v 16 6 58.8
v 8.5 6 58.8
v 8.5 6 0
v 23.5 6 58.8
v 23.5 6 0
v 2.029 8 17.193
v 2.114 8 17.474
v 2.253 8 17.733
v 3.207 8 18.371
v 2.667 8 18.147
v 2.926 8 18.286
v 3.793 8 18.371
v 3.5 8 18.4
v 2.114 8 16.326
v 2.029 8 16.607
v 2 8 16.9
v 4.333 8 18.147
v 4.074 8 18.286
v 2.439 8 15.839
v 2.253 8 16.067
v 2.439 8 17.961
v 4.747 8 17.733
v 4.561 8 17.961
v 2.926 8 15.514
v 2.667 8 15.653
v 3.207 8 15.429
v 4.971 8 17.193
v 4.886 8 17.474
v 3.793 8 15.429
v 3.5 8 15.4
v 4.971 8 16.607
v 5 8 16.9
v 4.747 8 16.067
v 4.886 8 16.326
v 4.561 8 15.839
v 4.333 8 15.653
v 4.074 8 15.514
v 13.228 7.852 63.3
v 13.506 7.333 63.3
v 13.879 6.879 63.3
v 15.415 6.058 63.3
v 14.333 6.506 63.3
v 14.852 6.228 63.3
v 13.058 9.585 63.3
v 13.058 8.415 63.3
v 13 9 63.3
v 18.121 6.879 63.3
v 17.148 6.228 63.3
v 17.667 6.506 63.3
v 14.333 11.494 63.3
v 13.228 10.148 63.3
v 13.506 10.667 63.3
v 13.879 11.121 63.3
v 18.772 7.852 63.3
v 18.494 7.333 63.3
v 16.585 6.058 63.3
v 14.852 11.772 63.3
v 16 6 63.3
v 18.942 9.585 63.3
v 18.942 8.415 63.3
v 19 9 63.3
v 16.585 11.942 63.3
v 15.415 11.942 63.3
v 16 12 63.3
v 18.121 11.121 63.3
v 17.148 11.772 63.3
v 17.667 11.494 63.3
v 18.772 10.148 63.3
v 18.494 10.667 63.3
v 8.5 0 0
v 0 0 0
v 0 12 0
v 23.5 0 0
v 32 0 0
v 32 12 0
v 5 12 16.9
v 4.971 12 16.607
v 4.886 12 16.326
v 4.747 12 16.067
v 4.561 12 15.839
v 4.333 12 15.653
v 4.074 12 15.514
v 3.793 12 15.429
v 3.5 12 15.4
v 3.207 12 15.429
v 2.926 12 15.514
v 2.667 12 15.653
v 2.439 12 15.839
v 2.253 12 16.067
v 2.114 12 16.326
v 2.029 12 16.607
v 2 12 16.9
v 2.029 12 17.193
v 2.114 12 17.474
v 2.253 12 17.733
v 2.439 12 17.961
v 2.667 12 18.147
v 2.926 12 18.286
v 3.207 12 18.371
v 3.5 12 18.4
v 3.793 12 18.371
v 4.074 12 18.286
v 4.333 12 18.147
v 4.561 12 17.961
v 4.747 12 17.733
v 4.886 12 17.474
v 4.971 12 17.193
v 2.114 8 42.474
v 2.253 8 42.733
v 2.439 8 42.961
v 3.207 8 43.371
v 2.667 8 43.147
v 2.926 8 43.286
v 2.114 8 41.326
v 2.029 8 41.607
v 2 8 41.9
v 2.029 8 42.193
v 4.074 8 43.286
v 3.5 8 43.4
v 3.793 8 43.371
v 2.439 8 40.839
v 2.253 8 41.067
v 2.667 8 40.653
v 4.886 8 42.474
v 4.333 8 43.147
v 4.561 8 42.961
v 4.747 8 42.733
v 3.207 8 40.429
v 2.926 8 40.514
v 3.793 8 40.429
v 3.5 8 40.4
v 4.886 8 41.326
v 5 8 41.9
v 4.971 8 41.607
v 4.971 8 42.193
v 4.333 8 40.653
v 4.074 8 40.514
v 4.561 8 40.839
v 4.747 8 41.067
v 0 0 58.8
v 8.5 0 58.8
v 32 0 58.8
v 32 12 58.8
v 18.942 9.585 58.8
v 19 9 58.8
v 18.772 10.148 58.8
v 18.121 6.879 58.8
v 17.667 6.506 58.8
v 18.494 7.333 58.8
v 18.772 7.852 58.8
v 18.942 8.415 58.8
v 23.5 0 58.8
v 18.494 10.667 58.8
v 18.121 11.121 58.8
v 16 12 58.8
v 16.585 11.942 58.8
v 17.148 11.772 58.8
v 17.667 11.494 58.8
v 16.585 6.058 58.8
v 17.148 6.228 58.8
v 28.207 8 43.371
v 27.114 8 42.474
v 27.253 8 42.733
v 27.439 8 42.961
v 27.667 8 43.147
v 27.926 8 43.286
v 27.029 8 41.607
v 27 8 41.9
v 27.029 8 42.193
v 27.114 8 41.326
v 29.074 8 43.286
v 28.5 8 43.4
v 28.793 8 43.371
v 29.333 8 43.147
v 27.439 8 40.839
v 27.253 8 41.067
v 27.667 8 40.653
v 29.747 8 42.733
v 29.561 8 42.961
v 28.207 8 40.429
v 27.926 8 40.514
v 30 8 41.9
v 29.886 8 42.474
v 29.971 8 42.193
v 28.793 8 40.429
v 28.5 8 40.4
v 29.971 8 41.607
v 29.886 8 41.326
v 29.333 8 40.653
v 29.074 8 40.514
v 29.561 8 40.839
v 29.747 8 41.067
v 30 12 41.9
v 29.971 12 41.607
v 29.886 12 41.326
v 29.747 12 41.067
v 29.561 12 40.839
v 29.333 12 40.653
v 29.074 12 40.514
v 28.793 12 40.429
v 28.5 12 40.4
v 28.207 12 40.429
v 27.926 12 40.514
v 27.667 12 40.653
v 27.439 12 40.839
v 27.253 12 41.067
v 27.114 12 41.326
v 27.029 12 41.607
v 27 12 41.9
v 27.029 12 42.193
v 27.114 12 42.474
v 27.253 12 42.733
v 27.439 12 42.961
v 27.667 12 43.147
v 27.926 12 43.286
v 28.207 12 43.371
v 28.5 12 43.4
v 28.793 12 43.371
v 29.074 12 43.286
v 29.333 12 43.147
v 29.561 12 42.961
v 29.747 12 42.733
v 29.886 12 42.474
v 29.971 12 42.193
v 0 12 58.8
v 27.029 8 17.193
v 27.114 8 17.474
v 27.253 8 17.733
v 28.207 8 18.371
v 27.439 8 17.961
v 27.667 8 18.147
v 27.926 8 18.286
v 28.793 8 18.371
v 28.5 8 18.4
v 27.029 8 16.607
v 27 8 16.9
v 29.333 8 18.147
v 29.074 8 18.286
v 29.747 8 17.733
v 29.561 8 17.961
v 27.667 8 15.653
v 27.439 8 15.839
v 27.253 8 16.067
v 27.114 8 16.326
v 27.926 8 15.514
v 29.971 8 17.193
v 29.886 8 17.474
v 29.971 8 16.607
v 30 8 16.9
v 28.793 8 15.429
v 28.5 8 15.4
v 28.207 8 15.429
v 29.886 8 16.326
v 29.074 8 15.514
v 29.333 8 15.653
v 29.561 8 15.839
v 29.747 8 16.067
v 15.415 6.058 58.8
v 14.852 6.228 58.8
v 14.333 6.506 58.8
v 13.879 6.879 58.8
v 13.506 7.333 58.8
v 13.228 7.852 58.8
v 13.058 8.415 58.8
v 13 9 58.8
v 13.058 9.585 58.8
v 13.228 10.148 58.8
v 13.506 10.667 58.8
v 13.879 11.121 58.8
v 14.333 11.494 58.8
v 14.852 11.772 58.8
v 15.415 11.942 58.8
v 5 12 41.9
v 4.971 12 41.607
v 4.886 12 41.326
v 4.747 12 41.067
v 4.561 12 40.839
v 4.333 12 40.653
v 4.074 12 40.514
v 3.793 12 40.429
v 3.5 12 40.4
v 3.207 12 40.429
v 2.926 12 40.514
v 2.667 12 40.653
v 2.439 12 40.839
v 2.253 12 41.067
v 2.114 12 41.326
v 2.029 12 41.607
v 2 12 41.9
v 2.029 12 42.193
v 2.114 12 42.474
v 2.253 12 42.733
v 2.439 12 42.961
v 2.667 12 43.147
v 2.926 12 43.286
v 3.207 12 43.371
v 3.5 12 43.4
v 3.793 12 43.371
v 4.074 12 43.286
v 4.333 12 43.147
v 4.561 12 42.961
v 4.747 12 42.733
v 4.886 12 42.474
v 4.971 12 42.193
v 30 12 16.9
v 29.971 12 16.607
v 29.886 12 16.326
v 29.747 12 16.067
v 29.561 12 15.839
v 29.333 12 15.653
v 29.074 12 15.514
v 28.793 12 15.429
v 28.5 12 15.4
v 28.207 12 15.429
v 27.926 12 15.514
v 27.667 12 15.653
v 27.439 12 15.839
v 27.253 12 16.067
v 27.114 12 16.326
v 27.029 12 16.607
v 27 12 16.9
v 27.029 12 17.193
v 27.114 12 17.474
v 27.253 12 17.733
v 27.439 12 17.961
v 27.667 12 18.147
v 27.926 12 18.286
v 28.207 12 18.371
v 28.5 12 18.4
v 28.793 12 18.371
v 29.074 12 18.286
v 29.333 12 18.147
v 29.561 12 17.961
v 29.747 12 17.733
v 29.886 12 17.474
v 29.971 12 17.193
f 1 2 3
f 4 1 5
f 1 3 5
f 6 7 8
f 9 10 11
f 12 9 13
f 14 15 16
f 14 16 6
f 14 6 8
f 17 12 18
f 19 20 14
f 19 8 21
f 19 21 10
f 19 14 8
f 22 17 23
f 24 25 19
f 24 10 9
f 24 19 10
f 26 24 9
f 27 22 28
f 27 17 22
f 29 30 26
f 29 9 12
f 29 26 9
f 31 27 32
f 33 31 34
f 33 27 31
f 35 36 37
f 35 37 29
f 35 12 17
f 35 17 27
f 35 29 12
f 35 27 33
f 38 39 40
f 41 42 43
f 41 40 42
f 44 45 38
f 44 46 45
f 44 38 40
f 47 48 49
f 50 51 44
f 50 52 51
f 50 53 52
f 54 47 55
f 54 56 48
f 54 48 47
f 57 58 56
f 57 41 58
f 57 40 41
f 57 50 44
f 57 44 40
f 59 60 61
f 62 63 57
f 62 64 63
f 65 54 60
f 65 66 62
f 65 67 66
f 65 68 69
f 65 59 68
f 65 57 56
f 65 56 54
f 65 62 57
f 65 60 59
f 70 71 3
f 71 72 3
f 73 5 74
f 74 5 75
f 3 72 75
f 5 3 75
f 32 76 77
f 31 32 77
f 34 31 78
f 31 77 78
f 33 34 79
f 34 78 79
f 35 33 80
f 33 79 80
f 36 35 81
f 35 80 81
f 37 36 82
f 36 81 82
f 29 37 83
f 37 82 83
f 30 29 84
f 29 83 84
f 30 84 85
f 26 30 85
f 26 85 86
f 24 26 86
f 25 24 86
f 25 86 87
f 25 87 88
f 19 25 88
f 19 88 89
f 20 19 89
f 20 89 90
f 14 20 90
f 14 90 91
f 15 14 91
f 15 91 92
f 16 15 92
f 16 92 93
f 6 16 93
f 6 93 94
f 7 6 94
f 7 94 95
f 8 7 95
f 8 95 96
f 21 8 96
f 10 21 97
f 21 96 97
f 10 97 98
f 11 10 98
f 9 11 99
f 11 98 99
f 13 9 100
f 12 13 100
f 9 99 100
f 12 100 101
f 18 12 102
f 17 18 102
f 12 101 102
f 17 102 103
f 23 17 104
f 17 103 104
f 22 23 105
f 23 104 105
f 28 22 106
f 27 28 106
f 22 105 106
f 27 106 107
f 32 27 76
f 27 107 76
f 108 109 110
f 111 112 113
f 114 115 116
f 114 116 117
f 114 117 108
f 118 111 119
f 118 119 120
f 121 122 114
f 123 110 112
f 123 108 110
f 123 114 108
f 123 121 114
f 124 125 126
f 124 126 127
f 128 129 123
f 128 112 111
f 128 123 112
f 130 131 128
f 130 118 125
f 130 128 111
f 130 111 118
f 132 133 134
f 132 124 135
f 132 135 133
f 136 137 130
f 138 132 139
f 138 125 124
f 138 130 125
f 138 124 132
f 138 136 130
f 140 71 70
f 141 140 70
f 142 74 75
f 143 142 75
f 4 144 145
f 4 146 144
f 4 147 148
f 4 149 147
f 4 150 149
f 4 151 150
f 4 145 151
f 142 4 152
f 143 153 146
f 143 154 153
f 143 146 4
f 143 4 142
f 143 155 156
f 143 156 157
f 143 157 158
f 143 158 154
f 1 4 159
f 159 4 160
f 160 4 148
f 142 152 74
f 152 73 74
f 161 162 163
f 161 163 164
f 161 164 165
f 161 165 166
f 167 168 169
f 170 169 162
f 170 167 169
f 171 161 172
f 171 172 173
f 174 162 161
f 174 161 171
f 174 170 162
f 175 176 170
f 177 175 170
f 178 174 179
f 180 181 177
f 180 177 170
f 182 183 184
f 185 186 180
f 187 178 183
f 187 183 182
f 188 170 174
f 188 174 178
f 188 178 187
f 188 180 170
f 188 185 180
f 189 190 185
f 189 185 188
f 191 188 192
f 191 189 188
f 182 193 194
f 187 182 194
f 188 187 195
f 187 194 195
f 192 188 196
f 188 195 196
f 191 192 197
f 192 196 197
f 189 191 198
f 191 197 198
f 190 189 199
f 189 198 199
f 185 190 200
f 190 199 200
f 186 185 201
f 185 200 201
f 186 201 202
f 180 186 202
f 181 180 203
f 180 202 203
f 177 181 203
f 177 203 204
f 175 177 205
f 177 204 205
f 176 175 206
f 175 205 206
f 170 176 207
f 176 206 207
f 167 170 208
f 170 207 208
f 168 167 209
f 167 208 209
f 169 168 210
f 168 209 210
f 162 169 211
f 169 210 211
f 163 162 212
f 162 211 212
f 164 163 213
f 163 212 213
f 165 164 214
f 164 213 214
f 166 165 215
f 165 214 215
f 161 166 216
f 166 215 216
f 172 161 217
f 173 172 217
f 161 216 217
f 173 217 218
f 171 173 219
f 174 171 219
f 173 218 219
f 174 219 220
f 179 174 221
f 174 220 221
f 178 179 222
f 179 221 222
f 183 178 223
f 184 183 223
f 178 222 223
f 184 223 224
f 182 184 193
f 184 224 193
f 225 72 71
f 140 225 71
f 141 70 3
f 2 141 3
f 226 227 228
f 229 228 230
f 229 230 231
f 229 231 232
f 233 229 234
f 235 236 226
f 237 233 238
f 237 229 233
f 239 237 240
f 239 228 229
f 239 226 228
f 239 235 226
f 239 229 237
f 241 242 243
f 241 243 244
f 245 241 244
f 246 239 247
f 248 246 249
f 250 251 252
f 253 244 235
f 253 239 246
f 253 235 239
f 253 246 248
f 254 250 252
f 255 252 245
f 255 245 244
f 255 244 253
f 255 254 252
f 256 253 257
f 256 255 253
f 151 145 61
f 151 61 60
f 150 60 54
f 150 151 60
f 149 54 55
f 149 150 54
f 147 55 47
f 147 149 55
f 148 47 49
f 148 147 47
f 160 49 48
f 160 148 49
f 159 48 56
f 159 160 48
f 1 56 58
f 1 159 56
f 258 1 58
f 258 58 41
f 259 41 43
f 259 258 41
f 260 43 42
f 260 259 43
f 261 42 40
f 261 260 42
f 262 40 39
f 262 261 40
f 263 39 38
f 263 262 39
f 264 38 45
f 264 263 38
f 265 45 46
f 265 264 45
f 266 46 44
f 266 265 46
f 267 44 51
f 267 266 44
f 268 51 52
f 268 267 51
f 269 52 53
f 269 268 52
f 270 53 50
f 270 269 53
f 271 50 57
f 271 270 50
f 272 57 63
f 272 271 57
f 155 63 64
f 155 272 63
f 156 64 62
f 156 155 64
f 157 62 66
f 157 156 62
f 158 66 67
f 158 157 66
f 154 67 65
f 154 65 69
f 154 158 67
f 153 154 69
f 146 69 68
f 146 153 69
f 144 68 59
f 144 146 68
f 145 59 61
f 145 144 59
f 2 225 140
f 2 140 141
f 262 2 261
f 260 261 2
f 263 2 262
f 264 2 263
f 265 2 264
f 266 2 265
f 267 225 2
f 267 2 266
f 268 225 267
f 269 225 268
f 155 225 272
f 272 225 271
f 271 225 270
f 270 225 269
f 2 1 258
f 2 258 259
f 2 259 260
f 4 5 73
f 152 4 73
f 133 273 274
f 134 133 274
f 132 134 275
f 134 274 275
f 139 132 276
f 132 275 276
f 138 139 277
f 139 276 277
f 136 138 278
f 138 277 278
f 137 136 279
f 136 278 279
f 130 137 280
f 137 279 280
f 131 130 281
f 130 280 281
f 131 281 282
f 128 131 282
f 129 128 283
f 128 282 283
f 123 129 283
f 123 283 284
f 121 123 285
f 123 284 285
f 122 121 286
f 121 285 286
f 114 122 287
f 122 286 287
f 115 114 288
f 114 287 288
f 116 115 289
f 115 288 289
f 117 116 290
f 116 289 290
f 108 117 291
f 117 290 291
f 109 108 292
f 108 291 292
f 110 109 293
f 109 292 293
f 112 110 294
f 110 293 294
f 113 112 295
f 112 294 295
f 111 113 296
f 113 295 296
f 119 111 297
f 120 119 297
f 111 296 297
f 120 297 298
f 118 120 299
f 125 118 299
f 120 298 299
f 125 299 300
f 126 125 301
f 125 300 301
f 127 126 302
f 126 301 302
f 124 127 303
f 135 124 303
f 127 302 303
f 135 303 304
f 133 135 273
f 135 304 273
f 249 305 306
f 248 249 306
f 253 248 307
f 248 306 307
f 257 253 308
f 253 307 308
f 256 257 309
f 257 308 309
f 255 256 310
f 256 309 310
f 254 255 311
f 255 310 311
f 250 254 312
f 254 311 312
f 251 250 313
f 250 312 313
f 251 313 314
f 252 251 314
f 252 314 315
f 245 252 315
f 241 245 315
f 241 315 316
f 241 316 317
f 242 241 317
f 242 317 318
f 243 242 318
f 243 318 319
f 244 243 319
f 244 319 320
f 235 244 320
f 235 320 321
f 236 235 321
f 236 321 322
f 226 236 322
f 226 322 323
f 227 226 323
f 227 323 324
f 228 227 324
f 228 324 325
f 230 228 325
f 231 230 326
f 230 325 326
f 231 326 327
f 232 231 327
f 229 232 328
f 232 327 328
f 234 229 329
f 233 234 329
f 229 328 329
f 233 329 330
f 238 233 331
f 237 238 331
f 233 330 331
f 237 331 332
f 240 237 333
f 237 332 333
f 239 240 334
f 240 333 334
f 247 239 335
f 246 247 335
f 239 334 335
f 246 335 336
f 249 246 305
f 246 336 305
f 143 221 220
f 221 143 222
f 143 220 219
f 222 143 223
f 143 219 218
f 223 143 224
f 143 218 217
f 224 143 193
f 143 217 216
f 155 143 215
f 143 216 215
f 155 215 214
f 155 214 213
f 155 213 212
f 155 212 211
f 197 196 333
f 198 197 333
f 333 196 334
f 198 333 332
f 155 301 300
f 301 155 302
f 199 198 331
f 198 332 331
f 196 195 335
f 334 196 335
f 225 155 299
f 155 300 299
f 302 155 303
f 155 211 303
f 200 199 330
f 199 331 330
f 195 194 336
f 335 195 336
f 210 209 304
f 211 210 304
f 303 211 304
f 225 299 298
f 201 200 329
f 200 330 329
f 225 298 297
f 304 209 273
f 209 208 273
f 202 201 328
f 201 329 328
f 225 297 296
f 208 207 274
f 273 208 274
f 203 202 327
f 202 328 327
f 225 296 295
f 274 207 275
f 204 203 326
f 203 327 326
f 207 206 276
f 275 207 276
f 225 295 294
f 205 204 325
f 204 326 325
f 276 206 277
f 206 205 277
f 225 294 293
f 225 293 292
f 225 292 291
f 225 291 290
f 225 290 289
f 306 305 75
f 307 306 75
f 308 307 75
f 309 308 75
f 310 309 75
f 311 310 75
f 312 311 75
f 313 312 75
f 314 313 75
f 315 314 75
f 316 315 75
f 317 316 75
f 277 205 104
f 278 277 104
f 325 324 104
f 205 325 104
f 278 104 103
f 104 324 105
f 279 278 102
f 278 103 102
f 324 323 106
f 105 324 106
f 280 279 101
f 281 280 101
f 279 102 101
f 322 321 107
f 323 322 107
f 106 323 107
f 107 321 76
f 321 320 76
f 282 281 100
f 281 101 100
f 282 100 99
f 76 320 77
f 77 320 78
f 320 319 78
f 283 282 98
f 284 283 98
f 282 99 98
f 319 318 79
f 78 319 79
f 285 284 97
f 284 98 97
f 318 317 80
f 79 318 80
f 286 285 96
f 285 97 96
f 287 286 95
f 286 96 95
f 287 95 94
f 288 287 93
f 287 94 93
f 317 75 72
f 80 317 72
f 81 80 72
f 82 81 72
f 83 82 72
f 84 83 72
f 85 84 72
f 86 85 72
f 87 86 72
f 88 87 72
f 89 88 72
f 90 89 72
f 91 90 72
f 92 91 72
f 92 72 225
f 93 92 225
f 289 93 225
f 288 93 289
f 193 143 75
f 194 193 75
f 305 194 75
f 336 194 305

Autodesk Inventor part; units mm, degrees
ref_plane "YZ Plane" through (0, 0, 0) normal (1, 0, 0) x (0, 1, 0)
ref_plane "XZ Plane" through (0, 0, 0) normal (0, 1, 0) x (-1, 0, 0)
ref_plane "XY Plane" through (0, 0, 0) normal (0, 0, 1) x (1, 0, 0)
sketch "Sketch1" plane through (0, 0, 0) normal (0, 0, 1) x (1, 0, 0)
  line L0 (0, 12) -> (0, 0)
  line L1 (0, 0) -> (8.5, 0)
  line L2 (8.5, 0) -> (8.5, 6)
  line L3 (8.5, 6) -> (23.5, 6)
  line L4 (23.5, 6) -> (23.5, 0)
  line L5 (23.5, 0) -> (32, 0)
  line L6 (32, 0) -> (32, 12)
  line L7 (32, 12) -> (0, 12)
  dimension "d0" = 32
  dimension "d1" = 12
  dimension "d2" = 8.5
  dimension "d3" = 6
extrude "Extrusion1" add sketch "Sketch1" along normal blind 58.8
sketch "Sketch2" plane through (0, 12, 0) normal (0, 1, 0) x (1, 0, 0)
  line L0 (3.5, -41.9) -> (28.5, -41.9) construction
  line L1 (28.5, -41.9) -> (28.5, -16.9) construction
  line L2 (28.5, -16.9) -> (3.5, -16.9) construction
  line L3 (3.5, -16.9) -> (3.5, -41.9) construction
  circle A0 centre (3.5, -41.9) radius 1.5
  circle A1 centre (3.5, -16.9) radius 1.5
  circle A2 centre (28.5, -41.9) radius 1.5
  circle A3 centre (28.5, -16.9) radius 1.5
  line L4 (32, -58.8) -> (0, -58.8) construction
  line L5 (32, 0) -> (0, 0) construction
  line L6 (16, -41.9) -> (16, -58.8) construction
  line L7 (16, -16.9) -> (16, 0) construction
  dimension "d6" = 3
  dimension "d7" = 25
  dimension "d8" = 25
extrude "Extrusion2" cut sketch "Sketch2" against normal blind 4
sketch "Sketch3" plane through (0, 0, 58.8) normal (0, 0, 1) x (1, 0, 0)
  line L0 (8.5, 6) -> (23.5, 6) projected
  line L1 (32, 12) -> (0, 12) projected
  circle A0 centre (16, 9) radius 3
  point P0 (0, 0)
  point P1 (16, 12)
  dimension "d11" = 6
extrude "Extrusion3" add sketch "Sketch3" along normal blind 4.5
properties part number "MGN15H-Carrier"
